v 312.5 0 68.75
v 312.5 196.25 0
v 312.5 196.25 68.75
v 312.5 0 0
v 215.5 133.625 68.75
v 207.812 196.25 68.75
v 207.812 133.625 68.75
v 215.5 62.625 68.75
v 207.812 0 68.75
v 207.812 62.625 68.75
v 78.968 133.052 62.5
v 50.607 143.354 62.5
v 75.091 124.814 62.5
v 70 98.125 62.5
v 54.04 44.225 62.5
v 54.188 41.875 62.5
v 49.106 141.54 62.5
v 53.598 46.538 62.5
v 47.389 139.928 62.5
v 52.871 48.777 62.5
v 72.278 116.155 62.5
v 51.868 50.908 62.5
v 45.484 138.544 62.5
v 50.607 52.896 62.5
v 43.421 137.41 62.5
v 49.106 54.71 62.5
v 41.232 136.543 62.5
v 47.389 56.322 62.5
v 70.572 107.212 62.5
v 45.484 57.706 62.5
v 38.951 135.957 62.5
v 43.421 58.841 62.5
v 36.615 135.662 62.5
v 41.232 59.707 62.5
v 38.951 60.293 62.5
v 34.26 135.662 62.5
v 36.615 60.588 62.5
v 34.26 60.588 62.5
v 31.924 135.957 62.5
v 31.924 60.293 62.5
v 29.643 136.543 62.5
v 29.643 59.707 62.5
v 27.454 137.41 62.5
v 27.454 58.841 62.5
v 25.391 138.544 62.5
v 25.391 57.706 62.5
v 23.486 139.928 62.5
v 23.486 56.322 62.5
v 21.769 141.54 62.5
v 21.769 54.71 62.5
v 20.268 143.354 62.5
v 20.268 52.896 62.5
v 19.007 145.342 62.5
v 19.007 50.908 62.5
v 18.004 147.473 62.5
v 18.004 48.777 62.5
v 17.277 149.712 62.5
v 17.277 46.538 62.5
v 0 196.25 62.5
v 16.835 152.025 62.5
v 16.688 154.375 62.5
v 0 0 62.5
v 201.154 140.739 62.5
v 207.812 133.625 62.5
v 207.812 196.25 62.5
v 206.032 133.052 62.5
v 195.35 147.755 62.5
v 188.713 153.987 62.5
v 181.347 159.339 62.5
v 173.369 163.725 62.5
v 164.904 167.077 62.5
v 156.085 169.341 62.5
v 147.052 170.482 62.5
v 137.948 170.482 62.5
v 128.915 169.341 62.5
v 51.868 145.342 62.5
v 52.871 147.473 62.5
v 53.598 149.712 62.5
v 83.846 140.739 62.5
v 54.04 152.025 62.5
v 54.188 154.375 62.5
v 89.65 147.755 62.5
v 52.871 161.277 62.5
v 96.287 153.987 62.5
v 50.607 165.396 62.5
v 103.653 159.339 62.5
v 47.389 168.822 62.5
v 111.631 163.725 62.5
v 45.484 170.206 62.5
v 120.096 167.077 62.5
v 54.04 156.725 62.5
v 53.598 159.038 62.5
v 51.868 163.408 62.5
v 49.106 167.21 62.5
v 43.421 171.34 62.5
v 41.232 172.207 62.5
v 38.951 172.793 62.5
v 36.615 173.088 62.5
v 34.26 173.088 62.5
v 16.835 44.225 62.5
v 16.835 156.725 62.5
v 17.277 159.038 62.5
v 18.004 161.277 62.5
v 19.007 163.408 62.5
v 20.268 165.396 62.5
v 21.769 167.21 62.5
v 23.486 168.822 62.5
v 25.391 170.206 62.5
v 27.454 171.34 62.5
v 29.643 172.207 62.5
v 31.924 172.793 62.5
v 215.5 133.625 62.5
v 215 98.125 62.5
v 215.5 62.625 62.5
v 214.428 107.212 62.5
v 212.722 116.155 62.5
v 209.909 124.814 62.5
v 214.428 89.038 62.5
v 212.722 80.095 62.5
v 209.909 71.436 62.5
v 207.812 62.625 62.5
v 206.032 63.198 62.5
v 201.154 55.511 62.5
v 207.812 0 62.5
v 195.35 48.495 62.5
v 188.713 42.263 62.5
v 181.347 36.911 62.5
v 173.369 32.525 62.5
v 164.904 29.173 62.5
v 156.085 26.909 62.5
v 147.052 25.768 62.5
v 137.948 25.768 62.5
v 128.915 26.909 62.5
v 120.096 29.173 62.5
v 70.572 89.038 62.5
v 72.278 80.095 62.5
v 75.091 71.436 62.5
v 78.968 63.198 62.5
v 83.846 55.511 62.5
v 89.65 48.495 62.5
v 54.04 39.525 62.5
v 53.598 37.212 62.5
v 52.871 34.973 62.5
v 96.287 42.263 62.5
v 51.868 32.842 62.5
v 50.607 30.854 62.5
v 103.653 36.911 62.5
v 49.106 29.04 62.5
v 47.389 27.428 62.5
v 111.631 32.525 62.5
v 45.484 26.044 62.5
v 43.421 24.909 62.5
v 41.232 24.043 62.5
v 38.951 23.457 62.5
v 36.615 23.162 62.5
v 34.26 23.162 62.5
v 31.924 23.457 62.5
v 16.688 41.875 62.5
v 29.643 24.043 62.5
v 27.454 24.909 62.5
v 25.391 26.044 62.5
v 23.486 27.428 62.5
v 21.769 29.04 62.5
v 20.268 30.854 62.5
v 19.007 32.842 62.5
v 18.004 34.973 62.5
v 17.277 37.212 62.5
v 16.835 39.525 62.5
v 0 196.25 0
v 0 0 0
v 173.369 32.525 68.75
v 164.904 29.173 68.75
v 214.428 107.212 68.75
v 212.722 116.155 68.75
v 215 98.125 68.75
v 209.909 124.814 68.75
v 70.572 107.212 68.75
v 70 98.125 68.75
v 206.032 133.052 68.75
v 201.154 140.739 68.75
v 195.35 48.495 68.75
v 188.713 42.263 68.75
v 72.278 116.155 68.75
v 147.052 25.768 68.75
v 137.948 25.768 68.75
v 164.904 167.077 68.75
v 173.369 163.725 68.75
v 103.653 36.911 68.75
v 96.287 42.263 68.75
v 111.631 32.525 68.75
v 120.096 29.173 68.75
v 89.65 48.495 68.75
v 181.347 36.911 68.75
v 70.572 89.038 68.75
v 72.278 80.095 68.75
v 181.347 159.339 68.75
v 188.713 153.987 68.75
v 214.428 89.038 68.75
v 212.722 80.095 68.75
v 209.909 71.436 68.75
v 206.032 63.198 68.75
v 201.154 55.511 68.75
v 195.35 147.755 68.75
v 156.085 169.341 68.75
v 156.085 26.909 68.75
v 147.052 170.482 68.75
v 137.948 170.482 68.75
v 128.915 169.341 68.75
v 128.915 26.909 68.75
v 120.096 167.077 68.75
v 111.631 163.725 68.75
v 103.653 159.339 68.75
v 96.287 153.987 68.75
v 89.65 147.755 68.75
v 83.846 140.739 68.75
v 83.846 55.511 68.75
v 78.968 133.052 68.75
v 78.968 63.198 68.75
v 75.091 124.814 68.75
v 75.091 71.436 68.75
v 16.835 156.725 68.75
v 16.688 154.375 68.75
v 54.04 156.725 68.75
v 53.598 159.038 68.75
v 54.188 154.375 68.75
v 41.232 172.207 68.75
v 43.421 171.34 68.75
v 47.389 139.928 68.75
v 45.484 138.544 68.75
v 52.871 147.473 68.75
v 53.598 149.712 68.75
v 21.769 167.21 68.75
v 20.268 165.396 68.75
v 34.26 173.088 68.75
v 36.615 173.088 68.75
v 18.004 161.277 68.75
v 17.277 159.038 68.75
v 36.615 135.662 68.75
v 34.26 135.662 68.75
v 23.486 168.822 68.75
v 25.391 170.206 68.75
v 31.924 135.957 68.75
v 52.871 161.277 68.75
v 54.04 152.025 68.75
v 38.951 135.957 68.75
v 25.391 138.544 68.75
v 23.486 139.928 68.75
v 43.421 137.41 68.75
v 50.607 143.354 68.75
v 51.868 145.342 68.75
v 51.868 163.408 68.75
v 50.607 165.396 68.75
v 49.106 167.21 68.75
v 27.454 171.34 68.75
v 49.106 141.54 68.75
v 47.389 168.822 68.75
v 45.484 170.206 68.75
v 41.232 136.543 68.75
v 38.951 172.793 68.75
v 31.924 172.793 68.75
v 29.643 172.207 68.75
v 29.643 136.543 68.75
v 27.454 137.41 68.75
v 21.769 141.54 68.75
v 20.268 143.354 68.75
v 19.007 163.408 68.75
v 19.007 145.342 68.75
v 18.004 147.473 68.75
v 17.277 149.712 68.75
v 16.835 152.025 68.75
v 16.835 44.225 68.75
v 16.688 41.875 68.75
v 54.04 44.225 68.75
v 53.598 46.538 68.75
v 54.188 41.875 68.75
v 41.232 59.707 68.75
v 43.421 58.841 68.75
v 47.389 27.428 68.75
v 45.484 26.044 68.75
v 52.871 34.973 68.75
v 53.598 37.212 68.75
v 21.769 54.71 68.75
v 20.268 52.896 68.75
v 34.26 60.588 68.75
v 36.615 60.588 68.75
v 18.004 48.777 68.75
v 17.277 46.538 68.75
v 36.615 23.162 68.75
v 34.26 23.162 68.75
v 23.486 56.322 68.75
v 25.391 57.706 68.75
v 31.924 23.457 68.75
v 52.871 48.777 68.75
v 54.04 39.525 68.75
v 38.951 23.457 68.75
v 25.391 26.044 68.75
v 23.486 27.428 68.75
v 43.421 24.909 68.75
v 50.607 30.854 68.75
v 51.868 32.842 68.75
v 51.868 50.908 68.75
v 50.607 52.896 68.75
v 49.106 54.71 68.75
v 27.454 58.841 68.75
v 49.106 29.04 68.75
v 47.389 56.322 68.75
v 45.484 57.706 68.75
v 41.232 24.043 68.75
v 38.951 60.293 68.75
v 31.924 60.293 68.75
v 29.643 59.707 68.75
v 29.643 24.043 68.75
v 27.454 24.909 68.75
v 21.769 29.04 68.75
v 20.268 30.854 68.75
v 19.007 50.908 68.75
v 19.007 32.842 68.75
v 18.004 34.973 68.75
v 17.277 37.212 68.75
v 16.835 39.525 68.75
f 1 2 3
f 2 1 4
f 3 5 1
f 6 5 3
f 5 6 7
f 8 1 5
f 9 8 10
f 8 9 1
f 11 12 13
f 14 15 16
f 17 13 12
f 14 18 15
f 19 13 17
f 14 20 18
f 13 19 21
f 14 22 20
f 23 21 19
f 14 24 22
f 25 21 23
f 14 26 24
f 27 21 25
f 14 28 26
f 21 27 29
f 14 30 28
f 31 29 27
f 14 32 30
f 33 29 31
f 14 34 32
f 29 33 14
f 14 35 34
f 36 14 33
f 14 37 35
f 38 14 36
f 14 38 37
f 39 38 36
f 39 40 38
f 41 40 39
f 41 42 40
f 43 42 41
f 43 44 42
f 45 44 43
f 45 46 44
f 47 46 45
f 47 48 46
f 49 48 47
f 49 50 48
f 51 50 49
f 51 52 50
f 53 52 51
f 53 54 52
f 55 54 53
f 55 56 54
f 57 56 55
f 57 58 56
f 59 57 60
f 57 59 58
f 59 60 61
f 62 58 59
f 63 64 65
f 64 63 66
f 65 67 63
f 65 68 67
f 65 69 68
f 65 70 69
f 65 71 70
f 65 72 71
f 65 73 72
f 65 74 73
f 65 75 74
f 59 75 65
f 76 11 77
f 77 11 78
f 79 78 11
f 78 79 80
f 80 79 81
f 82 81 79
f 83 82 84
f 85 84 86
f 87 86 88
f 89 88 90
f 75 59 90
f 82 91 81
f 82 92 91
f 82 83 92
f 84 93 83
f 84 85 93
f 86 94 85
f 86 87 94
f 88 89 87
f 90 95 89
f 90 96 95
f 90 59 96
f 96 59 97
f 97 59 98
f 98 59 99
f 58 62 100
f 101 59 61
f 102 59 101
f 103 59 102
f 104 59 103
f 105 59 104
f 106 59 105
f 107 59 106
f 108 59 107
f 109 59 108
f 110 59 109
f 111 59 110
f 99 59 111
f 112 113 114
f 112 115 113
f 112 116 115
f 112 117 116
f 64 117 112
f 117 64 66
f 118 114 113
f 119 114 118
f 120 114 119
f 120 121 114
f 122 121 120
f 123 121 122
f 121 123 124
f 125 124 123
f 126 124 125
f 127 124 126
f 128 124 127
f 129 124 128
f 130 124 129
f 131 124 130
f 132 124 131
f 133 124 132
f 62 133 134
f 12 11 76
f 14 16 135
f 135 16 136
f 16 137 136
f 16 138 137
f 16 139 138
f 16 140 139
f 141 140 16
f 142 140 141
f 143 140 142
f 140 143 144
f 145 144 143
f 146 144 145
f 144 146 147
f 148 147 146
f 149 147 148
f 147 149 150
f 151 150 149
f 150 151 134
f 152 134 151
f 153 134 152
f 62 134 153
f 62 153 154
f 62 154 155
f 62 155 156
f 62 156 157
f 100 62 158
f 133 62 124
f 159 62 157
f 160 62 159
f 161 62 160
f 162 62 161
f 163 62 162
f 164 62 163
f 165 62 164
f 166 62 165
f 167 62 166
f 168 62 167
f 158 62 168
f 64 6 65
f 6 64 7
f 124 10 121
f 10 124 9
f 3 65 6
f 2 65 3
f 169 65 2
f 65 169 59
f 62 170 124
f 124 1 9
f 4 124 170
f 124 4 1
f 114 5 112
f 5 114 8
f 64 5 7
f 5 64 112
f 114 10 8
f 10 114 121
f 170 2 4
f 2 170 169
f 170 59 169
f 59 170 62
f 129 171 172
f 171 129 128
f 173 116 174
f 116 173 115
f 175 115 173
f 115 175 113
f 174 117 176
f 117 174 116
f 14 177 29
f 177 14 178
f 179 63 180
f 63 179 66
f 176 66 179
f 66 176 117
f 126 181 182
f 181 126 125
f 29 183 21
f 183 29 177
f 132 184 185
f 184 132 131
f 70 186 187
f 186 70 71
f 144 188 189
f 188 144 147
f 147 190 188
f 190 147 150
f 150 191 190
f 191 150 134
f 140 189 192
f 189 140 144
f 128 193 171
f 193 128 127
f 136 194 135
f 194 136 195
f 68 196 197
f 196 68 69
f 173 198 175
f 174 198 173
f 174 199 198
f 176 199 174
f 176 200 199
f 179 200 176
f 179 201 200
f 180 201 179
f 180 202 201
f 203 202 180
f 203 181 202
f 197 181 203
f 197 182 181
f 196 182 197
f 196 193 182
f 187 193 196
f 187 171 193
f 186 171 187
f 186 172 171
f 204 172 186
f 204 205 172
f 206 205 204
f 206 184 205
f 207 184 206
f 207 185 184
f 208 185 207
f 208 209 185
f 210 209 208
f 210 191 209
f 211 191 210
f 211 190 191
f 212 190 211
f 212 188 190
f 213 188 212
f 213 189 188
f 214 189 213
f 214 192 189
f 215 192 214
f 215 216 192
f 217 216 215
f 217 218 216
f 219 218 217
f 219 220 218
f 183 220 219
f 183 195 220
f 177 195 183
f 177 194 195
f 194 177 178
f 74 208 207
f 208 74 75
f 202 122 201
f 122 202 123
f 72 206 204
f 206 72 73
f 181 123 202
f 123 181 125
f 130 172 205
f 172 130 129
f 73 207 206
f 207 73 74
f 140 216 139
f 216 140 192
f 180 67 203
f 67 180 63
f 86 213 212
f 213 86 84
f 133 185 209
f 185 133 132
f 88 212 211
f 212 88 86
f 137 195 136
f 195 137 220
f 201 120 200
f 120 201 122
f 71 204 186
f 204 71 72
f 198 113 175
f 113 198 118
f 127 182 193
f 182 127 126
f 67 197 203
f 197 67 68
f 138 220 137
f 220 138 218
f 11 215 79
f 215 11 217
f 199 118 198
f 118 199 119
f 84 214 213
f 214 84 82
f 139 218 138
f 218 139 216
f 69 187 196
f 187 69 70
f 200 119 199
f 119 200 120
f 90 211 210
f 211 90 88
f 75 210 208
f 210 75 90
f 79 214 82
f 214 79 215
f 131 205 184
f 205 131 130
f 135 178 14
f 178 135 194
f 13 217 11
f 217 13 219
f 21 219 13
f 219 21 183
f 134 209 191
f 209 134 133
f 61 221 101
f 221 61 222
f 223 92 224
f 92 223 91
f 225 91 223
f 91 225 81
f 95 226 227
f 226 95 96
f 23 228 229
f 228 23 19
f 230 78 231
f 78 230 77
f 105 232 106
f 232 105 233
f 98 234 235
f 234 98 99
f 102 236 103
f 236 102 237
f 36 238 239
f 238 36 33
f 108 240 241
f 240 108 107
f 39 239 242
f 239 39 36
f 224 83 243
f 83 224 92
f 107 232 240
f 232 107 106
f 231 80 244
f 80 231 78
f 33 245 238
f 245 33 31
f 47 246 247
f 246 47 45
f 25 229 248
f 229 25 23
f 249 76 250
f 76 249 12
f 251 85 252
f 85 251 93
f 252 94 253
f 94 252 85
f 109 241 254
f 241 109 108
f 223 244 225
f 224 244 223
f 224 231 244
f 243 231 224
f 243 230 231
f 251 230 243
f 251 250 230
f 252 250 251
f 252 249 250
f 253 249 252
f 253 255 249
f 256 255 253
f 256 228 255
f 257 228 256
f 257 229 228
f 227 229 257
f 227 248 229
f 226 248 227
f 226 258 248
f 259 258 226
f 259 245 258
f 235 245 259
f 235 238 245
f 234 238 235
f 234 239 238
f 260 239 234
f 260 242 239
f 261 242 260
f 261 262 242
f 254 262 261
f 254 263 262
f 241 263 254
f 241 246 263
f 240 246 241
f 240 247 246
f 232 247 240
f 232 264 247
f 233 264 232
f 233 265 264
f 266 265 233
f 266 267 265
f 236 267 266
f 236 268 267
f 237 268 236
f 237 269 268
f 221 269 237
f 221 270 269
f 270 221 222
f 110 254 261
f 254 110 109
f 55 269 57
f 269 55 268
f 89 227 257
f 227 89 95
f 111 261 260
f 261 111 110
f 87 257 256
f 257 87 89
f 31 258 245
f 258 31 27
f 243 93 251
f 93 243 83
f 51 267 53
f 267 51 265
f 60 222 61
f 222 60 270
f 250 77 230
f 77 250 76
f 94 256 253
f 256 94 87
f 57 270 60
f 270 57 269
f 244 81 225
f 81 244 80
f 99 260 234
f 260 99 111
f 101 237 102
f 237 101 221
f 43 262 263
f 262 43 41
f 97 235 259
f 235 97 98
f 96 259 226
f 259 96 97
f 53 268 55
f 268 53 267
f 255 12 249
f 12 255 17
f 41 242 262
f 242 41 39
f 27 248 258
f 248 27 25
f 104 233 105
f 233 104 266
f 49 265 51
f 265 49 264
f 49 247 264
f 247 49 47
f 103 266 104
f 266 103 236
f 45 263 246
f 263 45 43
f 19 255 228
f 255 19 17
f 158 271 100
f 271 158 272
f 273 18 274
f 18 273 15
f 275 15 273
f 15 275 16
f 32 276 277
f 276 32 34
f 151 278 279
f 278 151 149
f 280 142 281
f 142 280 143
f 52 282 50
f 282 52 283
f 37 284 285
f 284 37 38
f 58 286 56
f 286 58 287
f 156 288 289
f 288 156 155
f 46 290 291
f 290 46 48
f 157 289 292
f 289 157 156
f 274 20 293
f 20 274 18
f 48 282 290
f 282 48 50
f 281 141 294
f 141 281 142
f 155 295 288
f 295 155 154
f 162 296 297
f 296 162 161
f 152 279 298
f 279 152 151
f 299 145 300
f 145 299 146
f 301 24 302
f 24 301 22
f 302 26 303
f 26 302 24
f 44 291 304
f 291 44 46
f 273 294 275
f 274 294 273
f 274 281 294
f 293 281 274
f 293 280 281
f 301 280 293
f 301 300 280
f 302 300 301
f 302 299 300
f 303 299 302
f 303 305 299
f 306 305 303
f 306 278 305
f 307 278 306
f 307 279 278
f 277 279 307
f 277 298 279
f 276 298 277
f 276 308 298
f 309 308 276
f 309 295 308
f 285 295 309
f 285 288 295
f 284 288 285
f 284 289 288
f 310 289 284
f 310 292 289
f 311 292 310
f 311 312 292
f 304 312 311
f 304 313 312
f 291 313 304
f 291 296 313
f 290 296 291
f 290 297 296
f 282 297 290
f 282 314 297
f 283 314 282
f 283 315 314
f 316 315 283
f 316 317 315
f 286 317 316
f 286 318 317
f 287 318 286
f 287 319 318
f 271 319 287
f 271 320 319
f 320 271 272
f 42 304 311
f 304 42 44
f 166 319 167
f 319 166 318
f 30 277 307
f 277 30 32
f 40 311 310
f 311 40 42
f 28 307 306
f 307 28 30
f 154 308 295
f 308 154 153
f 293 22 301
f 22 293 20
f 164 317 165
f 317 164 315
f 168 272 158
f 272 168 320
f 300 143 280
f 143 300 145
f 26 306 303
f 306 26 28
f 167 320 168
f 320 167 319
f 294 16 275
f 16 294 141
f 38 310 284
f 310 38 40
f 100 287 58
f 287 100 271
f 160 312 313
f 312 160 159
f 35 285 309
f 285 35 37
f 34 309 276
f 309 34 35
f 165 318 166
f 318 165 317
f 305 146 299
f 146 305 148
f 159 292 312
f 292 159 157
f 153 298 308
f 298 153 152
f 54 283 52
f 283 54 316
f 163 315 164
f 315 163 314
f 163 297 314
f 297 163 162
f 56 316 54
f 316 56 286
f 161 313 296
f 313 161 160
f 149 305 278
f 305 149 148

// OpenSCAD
scale = 0.0625;//1:16

length = 5000;
width  = 3140;
height = 1000;
scale([scale,scale,scale]){
	//upper section
	translate([0,0,0])
		cube([length,width,height]);
	//turret
	translate([(length-1540-1180),(width/2),height])
		cylinder(100,1160,1160, $fn=50);

	//driver
	translate([(length-1540-1180-1713),(width/2)+900,height])
		cylinder(100,300,300, $fn=50);

	//radio operator
	translate([(length-1540-1180-1713),(width/2)-900,height])
		cylinder(100,300,300, $fn=50);

	//engine section
	translate([(length-1540-135),0,height]){
		difference(){
			cube([1540+135,width,100]);
			translate([0,(width/2-1136/2),-10])
				cube([123,1136,120]);
		}
	}


} //scale
